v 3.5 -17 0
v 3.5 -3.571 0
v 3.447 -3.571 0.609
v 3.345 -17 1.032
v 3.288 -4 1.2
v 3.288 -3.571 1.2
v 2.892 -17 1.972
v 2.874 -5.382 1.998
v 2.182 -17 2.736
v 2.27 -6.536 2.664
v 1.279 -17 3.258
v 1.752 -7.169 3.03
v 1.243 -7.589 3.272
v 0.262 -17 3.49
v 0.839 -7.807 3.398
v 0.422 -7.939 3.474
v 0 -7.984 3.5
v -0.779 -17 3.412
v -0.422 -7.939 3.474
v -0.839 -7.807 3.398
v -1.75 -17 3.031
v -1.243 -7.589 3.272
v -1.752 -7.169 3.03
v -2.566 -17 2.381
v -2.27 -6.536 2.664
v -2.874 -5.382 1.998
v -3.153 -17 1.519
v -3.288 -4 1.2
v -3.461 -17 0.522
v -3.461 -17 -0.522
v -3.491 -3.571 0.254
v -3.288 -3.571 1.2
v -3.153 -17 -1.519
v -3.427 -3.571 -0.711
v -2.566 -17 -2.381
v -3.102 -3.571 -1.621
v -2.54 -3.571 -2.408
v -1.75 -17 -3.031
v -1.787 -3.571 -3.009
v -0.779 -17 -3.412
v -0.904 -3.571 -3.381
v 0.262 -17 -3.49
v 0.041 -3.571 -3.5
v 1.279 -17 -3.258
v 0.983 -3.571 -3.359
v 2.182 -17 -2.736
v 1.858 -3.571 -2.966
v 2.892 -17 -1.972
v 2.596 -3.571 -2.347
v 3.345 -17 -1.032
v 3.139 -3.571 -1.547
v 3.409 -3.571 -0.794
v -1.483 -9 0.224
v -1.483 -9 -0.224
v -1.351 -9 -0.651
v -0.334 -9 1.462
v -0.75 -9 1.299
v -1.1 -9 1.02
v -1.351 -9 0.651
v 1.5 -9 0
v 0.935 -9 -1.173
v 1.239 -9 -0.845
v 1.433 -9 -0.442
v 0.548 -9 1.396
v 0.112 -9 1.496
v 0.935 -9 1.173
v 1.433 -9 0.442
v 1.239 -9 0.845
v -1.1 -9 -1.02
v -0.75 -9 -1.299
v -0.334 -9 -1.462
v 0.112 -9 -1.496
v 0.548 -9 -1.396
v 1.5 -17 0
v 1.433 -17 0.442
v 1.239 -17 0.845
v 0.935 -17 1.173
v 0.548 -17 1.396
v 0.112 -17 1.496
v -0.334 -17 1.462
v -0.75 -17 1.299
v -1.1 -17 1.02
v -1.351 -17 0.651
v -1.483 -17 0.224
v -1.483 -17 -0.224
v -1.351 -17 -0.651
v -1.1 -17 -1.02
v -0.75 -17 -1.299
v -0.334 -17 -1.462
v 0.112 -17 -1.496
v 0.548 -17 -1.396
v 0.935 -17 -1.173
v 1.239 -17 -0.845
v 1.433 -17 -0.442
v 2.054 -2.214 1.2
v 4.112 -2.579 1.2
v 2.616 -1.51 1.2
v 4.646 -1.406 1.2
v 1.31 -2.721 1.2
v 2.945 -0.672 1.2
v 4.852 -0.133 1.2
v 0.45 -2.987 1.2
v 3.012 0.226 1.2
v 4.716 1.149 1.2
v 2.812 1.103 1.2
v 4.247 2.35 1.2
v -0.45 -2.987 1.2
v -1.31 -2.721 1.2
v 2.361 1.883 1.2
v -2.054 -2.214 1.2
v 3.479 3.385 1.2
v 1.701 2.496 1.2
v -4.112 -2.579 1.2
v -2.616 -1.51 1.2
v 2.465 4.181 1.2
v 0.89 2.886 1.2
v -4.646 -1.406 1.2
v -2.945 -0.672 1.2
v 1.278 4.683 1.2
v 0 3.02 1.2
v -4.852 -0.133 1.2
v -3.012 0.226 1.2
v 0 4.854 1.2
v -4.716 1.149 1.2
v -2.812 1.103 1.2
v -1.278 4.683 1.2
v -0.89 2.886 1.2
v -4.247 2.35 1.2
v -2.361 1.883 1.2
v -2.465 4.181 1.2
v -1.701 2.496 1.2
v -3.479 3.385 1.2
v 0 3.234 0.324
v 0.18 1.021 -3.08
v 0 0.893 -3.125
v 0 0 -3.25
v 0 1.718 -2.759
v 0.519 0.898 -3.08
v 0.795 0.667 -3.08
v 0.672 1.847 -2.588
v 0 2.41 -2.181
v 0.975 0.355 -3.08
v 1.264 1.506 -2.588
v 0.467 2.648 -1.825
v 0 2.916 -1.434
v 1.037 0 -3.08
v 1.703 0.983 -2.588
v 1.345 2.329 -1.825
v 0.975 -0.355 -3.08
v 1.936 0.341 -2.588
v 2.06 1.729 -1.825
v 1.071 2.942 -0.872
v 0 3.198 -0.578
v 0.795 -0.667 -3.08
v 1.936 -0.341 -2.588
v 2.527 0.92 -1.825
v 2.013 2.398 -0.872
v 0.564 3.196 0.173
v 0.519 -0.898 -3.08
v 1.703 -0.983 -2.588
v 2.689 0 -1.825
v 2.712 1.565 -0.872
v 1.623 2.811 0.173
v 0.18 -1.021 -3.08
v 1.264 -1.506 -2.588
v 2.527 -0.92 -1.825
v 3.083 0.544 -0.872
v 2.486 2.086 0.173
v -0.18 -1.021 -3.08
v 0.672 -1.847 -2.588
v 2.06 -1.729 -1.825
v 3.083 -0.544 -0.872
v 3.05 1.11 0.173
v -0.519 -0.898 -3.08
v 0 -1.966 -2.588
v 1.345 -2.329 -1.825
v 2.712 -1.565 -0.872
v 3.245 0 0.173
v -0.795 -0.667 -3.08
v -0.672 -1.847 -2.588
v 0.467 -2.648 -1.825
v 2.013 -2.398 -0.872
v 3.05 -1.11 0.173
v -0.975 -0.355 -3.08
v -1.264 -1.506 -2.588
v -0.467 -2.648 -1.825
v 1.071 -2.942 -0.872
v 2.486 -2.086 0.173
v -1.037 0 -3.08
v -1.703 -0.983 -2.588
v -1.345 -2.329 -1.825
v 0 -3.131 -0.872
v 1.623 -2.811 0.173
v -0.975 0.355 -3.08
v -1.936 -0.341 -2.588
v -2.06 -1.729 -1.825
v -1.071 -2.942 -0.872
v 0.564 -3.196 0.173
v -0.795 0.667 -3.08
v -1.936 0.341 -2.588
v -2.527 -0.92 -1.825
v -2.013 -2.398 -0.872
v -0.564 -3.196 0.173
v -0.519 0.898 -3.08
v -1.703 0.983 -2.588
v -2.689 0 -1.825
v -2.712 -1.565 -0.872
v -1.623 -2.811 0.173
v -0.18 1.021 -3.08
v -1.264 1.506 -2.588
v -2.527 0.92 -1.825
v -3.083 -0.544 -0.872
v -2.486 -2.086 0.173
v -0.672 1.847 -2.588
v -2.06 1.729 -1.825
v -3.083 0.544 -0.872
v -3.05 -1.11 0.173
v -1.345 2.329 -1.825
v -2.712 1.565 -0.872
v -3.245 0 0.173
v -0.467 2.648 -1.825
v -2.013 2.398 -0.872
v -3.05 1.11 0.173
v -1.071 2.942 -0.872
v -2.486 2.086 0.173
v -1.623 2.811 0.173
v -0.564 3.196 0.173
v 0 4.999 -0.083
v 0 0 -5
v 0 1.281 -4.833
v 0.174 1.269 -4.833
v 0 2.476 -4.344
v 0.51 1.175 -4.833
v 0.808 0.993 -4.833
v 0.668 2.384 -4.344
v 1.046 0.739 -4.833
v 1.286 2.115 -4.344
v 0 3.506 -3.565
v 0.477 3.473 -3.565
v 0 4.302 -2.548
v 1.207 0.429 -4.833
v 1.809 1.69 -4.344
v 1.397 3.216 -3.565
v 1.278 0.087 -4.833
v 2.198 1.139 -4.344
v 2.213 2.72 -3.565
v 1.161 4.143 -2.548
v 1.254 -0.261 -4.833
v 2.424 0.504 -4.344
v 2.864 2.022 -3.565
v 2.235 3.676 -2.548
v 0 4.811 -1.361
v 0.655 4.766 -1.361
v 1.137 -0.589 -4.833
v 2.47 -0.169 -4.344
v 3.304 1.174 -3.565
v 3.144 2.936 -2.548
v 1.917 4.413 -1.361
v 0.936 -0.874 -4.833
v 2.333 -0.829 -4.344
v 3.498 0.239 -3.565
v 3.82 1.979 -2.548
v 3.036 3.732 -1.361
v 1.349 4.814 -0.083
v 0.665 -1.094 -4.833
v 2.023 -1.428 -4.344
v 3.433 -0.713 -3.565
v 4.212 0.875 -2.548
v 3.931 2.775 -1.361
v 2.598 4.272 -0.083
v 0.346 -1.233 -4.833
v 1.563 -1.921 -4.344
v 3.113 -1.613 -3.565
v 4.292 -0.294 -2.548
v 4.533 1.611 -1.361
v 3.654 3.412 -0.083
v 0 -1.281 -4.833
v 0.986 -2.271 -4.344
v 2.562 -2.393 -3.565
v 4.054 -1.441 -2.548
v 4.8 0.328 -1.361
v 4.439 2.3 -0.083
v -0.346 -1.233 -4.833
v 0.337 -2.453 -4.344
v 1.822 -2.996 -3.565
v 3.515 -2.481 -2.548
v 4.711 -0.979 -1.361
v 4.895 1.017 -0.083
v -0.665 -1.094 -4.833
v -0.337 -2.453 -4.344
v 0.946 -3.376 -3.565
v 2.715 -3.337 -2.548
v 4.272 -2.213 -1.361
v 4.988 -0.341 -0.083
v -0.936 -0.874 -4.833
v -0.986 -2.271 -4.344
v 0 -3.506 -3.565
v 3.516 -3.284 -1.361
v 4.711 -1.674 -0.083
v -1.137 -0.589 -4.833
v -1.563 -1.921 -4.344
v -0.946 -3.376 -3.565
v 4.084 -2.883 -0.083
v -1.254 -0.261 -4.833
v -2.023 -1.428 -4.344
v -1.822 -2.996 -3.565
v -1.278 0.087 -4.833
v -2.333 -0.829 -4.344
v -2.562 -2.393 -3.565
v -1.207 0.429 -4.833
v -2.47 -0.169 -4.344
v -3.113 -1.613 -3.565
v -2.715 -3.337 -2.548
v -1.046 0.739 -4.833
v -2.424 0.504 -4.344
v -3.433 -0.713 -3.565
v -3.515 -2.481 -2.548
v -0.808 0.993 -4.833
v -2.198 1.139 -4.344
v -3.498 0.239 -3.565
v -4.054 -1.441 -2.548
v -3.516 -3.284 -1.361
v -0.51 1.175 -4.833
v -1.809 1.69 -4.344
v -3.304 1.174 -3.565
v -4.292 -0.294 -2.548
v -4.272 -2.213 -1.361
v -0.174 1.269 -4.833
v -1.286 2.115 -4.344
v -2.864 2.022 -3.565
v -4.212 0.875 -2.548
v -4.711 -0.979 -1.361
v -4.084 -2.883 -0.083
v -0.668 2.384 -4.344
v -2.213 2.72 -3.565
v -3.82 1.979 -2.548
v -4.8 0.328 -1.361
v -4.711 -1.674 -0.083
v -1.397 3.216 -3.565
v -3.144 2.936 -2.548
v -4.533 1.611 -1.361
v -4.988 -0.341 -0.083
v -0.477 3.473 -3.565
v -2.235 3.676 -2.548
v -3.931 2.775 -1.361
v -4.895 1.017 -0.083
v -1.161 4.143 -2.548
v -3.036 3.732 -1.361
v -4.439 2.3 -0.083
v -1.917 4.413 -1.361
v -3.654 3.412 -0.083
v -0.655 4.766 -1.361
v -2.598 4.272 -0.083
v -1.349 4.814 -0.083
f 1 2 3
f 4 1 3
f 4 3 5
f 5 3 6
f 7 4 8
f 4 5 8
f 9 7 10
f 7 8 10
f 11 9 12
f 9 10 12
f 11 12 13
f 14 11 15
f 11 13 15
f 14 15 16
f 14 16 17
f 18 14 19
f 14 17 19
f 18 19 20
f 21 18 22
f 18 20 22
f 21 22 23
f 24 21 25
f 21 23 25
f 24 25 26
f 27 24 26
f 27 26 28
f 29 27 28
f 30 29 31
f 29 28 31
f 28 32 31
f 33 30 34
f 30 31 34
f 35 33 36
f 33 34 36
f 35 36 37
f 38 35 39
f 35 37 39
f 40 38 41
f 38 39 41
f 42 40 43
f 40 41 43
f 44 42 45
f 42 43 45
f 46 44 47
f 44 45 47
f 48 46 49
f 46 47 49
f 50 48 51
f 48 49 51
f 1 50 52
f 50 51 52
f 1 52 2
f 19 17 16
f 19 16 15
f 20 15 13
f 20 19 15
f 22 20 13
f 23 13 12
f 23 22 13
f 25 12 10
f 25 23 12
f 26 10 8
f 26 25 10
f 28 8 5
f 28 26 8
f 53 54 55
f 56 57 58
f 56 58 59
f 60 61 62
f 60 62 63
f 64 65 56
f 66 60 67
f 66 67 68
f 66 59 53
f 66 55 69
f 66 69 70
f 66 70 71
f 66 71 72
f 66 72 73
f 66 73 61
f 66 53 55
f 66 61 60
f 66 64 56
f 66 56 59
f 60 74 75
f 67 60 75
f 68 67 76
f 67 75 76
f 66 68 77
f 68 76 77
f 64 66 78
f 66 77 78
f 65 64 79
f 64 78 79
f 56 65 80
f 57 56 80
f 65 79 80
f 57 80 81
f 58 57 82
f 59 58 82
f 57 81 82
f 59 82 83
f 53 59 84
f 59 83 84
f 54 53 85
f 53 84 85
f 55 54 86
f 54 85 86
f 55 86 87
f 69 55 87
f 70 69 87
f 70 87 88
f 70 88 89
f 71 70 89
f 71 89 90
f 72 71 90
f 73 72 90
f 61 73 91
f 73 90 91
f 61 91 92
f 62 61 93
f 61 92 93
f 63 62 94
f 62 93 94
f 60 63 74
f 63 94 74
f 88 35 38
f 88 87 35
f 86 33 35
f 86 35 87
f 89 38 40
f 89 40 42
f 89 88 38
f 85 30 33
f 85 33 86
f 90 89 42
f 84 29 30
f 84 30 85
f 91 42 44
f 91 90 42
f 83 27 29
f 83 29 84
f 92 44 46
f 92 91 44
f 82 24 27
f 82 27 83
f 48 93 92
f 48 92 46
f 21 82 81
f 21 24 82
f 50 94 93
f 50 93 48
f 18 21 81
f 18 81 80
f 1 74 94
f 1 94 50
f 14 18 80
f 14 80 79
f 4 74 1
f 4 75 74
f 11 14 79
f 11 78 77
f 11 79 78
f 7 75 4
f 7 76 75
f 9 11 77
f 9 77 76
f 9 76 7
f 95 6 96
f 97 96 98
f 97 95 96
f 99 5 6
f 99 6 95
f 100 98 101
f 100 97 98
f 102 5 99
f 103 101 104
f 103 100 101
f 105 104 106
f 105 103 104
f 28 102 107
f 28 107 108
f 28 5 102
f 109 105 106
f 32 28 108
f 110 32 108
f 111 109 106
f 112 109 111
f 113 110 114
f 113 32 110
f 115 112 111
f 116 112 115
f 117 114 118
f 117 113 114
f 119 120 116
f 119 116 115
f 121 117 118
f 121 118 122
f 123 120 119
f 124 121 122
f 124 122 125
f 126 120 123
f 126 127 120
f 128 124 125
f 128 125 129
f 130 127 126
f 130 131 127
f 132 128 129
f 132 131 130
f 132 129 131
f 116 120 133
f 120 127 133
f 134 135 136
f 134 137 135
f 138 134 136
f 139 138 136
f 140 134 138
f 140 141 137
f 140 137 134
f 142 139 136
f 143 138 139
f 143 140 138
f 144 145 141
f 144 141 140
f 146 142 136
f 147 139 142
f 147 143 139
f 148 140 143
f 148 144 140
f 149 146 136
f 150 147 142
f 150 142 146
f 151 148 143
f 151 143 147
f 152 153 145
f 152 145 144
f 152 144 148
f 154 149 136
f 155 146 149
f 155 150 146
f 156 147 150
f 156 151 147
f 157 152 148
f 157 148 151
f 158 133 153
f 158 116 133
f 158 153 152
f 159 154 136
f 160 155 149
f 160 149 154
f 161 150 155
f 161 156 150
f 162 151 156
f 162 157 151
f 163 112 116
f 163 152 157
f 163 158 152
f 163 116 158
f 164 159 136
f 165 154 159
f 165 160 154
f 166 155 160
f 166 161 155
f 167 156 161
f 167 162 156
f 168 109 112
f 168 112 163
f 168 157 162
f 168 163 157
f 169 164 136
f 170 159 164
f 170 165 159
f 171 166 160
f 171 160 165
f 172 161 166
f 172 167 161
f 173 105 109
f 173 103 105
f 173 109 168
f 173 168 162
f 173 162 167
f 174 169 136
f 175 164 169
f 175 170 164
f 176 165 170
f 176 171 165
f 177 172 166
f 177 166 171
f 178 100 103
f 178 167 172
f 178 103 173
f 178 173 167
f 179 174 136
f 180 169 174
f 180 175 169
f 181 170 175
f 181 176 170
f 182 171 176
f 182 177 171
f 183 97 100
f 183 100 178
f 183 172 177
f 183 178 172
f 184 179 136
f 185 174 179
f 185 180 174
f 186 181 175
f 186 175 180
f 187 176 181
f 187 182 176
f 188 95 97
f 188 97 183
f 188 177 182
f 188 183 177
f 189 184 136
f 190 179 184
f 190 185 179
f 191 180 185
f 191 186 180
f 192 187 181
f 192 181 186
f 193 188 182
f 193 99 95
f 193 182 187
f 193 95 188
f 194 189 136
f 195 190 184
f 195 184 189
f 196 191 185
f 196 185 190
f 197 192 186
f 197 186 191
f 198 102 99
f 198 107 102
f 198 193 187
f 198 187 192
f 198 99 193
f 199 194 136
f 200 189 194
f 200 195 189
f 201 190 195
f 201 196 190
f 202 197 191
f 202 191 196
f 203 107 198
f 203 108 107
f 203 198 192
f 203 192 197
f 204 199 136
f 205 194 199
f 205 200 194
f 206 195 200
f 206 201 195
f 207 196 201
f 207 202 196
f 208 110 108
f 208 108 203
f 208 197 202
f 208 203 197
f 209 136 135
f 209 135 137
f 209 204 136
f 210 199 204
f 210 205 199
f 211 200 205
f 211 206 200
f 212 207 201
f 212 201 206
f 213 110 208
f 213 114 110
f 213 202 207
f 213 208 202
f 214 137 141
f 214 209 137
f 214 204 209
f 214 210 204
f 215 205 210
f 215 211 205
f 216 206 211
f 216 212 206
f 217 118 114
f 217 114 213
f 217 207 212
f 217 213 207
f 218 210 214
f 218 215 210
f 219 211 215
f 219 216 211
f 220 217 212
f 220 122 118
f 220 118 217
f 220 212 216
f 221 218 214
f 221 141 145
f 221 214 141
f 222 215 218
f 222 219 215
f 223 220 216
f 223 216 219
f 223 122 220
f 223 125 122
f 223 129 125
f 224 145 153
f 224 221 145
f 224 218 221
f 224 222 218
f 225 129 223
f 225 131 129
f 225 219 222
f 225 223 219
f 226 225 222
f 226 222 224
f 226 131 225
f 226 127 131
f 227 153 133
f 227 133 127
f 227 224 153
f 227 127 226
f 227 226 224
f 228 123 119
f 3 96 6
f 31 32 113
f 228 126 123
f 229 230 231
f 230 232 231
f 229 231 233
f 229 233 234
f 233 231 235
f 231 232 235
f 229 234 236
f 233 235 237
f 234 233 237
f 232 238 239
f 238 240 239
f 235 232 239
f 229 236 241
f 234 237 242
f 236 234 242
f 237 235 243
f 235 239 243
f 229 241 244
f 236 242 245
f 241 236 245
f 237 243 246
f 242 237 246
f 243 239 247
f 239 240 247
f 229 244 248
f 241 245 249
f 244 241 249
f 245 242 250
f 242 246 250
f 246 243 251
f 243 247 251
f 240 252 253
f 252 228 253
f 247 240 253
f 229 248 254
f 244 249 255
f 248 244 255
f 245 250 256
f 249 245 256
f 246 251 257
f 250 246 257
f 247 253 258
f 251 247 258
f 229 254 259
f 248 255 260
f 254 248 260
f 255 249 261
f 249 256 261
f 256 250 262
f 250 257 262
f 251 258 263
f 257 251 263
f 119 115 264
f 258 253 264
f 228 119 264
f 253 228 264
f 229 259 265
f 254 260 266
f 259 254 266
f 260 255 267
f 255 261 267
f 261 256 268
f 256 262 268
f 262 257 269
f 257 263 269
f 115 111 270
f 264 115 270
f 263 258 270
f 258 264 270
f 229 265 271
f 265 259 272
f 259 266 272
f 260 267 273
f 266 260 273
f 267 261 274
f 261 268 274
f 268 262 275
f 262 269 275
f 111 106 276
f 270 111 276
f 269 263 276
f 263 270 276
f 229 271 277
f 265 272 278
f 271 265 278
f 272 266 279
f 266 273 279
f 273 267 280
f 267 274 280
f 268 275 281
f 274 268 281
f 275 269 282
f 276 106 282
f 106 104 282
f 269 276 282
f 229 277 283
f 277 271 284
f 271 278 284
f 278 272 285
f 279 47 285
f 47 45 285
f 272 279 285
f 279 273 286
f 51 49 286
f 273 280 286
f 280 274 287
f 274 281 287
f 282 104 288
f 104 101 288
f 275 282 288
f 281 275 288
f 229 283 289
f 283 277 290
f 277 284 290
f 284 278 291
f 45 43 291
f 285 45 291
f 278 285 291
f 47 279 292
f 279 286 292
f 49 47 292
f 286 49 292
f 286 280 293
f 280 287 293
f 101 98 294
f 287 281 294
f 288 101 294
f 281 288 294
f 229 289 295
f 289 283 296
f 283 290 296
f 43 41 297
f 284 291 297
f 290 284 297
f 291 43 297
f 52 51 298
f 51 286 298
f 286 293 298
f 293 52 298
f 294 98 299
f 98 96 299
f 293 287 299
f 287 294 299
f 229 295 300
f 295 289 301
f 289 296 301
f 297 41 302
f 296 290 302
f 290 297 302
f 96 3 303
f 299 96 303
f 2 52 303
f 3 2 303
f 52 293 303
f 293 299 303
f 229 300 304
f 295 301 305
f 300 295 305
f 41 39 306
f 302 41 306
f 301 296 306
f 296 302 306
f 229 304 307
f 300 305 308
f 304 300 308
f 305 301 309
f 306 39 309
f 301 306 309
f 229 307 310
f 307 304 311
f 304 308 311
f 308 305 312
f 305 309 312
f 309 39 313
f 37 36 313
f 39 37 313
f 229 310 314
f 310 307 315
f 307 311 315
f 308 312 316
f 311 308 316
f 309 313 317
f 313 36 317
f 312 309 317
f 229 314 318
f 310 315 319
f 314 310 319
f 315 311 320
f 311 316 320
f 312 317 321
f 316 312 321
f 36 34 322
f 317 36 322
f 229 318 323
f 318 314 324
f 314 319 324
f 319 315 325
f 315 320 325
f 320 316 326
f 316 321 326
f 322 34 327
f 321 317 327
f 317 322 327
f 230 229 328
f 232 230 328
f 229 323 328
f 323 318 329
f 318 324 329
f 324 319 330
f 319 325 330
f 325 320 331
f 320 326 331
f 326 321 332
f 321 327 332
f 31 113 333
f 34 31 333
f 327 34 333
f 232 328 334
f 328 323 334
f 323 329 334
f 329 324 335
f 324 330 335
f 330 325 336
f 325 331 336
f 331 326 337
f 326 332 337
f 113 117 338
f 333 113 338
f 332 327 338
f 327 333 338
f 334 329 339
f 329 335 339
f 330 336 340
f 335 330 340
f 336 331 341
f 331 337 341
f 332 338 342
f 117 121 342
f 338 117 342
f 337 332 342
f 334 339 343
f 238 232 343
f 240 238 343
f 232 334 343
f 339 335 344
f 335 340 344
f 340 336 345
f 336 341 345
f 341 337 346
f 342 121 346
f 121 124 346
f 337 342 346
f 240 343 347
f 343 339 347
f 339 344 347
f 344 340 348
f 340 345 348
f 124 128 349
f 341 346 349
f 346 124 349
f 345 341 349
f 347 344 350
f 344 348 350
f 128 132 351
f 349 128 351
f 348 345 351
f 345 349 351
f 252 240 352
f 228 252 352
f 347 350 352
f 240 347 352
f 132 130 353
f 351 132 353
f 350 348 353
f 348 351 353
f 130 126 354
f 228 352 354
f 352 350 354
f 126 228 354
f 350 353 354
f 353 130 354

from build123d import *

# Parameters (mm, degrees)
F2_R          = 3.5
F3_DEPTH      = 17
F7_DEPTH      = 6
F7_DEPTH_BACK = 6
F8_R          = 1.5
F9_DEPTH      = 8


with BuildPart() as f1:
    # F0 (on Right) → F1 (revolve)
    with BuildSketch(Plane.YZ):
        with BuildLine():
            Line((0, 5), (0, -5))
            ThreePointArc((0, -5), (5, 0), (0, 5))
        make_face()
    revolve(axis=Axis((0, 0, 0), (0, 0, -1)))

    # F2 (on Front) → F3 (join)
    with BuildSketch(Plane.XZ):
        Circle(F2_R)
    extrude(amount=F3_DEPTH)

    # F4 (on Right) → F5 (revolve, cut)
    with BuildSketch(Plane.YZ):
        with BuildLine():
            Line((0, 3.25), (0, -3.25))
            ThreePointArc((0, -3.25), (3.25, 0), (0, 3.25))
        make_face()
    revolve(axis=Axis((0, 0, 0), (0, 0, -1)), mode=Mode.SUBTRACT)

    # F6 (on Right) → F7 (cut, two sides)
    with BuildSketch(Plane.YZ) as f7_sk:
        Polygon((-4, 1.2), (5.5, 1.2), (5.5, 5.2), (-10.9282032303, 5.2), align=None)
    extrude(amount=-F7_DEPTH, mode=Mode.SUBTRACT)
    extrude(f7_sk.sketch, amount=F7_DEPTH_BACK, mode=Mode.SUBTRACT)

    # F8 (on face) → F9 (cut)
    with BuildSketch(Plane.XZ.offset(17)):
        Circle(F8_R)
    extrude(amount=-F9_DEPTH, mode=Mode.SUBTRACT)


solid = f1.part
